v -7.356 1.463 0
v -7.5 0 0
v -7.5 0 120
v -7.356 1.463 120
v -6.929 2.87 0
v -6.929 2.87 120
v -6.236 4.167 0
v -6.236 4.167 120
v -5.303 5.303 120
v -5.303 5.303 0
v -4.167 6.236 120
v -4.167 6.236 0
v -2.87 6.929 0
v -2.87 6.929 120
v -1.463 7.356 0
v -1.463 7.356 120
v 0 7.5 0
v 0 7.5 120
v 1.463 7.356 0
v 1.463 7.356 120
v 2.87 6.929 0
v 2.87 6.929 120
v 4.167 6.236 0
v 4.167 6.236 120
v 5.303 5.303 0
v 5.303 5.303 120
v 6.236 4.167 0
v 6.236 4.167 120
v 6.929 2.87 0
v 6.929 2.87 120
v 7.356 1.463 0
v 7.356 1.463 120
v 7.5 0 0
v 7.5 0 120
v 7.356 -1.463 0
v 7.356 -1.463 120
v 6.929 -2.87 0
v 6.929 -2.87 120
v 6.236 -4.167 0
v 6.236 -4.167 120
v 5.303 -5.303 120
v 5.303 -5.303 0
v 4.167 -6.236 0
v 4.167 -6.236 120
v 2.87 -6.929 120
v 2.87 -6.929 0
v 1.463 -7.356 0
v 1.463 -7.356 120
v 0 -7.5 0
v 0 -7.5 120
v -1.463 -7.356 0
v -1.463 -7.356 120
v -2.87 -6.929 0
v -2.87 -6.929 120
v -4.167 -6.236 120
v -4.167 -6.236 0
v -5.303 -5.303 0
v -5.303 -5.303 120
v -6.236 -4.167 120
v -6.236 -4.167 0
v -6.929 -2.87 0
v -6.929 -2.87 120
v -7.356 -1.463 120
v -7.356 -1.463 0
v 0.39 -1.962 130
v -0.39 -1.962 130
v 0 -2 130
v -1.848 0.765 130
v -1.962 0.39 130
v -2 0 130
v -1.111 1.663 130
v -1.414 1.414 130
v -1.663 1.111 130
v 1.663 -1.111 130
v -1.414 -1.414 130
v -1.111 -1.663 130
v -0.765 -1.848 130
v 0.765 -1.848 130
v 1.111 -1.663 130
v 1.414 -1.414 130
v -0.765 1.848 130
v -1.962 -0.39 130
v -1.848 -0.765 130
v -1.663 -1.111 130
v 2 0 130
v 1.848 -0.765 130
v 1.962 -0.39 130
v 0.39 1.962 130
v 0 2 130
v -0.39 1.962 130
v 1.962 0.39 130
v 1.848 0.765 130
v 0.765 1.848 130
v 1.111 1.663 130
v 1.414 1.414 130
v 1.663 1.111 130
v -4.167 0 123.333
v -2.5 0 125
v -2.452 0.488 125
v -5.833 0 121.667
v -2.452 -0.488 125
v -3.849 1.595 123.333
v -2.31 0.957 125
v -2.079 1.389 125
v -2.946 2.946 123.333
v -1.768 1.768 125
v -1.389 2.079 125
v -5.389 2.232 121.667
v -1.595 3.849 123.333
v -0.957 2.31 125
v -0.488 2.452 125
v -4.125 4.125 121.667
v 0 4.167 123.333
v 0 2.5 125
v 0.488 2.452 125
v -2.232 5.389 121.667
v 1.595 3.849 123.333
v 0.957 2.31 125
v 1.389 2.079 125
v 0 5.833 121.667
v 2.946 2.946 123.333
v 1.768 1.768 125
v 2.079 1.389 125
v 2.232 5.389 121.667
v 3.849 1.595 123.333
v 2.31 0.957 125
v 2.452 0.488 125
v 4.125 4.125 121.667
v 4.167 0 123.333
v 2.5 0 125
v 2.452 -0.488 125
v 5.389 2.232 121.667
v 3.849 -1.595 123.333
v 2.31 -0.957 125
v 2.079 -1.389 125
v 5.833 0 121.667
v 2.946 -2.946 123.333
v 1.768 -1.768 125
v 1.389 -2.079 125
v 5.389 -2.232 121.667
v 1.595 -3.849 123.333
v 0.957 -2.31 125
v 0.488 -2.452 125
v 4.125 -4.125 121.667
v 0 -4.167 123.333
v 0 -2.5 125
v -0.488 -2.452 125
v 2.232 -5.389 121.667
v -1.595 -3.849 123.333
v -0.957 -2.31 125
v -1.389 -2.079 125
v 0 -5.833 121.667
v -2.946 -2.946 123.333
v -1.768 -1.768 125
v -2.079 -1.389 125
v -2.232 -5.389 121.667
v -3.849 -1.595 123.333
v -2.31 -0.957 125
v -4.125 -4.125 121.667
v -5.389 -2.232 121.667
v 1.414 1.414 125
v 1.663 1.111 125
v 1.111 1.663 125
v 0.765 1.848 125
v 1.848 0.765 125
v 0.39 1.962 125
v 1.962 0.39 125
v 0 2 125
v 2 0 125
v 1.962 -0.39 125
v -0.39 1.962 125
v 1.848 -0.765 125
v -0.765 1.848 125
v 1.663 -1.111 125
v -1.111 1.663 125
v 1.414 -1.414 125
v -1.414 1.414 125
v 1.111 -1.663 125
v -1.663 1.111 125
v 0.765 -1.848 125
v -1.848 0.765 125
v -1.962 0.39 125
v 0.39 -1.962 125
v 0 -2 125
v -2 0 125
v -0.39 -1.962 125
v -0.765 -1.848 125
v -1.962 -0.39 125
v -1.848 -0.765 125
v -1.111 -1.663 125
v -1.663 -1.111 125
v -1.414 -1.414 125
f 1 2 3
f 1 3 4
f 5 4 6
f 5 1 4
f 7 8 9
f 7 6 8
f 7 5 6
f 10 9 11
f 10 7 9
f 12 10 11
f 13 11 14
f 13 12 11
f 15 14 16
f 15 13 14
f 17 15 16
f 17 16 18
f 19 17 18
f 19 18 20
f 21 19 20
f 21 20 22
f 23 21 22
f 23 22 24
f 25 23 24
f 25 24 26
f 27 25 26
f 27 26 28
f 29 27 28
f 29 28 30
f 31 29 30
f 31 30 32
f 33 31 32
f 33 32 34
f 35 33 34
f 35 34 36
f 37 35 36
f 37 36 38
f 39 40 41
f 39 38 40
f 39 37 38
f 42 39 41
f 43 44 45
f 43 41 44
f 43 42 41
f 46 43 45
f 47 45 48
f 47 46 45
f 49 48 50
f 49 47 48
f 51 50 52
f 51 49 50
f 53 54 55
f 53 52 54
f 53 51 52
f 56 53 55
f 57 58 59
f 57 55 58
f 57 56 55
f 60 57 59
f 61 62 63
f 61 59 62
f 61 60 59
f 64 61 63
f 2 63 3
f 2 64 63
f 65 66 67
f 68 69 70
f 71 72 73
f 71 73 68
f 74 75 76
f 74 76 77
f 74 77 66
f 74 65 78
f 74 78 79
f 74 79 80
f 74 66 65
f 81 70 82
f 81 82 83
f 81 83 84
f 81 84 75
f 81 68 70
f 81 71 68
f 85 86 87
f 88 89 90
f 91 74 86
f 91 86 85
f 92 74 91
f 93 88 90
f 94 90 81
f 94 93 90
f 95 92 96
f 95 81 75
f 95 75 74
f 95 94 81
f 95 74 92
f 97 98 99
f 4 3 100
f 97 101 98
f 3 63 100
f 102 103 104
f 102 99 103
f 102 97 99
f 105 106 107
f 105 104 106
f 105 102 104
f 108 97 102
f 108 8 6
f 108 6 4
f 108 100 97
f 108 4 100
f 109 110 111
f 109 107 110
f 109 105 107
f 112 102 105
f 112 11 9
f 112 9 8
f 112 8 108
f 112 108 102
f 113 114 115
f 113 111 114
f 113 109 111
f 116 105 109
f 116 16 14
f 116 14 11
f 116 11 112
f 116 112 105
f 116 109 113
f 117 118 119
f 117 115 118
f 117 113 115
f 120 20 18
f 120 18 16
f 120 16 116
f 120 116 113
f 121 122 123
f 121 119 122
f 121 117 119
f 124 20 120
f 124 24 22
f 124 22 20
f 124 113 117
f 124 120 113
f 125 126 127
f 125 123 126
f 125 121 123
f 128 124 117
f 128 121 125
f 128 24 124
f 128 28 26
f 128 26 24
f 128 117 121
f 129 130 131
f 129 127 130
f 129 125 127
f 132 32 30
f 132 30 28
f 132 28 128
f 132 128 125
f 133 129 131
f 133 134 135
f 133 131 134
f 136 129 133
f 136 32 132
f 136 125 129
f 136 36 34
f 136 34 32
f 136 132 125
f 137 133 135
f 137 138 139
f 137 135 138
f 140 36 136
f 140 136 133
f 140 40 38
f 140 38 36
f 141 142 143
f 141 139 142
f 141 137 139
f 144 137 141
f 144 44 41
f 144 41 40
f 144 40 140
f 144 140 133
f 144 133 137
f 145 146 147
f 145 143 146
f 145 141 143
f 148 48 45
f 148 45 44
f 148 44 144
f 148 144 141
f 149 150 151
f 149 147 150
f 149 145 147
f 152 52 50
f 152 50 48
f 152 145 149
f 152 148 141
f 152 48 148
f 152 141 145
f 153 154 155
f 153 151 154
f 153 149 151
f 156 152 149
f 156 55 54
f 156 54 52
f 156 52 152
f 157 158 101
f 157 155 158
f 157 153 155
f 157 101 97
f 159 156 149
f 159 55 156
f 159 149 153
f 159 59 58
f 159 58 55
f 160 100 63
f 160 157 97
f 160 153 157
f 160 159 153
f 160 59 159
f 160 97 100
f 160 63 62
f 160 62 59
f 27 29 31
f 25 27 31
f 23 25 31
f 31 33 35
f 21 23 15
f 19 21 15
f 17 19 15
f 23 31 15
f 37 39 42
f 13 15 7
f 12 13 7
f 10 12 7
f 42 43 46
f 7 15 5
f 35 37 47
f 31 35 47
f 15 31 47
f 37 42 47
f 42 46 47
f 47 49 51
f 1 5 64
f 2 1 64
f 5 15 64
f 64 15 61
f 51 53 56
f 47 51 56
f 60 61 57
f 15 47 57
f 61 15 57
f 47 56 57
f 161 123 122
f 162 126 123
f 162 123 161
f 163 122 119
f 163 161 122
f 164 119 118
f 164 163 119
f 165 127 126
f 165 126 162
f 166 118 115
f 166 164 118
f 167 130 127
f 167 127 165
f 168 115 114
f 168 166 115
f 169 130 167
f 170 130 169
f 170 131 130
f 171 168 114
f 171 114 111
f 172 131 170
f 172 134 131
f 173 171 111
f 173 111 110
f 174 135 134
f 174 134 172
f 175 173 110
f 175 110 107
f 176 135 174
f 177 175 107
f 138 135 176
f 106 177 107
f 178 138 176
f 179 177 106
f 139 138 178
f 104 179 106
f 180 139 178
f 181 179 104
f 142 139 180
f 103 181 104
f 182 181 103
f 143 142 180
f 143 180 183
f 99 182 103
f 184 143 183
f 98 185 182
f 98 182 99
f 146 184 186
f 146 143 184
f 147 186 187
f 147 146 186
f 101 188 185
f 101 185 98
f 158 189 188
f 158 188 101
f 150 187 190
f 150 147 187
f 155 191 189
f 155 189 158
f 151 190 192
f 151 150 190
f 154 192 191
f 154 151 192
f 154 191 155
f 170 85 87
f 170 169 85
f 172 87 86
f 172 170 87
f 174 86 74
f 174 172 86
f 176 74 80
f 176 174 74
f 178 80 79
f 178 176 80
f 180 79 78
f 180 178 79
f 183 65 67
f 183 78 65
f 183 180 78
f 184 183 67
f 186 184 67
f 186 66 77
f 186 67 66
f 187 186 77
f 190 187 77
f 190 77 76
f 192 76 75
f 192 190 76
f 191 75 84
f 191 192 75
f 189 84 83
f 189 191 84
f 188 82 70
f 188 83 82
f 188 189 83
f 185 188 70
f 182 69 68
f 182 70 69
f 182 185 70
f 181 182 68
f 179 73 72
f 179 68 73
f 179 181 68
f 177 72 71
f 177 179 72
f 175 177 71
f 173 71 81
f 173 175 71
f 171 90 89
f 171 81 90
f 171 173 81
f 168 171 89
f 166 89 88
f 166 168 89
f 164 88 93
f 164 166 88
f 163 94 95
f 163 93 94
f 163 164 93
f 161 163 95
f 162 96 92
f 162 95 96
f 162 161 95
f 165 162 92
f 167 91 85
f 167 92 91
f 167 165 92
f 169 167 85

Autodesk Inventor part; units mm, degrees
ref_plane "YZ Plane" through (0, 0, 0) normal (1, 0, 0) x (0, 1, 0)
ref_plane "XZ Plane" through (0, 0, 0) normal (0, 1, 0) x (-1, 0, 0)
ref_plane "XY Plane" through (0, 0, 0) normal (0, 0, 1) x (1, 0, 0)
sketch "Sketch2" plane through (0, 0, 0) normal (0, 0, 1) x (-1, 0, 0)
  circle A0 centre (0, 0) radius 7.5
  dimension "d0" = 15
extrude "Extrusion1" add sketch "Sketch2" along normal blind 125
sketch "Sketch3" plane through (0, 0, 125) normal (0, 0, 1) x (1, 0, 0)
  circle A0 centre (0, 0) radius 2
  dimension "d3" = 4
extrude "Extrusion2" add sketch "Sketch3" along normal blind 5
chamfer "Chamfer1" distance 5 angle 45 1 edges at (7.5, 0, 125)
properties part number "Marcador"
